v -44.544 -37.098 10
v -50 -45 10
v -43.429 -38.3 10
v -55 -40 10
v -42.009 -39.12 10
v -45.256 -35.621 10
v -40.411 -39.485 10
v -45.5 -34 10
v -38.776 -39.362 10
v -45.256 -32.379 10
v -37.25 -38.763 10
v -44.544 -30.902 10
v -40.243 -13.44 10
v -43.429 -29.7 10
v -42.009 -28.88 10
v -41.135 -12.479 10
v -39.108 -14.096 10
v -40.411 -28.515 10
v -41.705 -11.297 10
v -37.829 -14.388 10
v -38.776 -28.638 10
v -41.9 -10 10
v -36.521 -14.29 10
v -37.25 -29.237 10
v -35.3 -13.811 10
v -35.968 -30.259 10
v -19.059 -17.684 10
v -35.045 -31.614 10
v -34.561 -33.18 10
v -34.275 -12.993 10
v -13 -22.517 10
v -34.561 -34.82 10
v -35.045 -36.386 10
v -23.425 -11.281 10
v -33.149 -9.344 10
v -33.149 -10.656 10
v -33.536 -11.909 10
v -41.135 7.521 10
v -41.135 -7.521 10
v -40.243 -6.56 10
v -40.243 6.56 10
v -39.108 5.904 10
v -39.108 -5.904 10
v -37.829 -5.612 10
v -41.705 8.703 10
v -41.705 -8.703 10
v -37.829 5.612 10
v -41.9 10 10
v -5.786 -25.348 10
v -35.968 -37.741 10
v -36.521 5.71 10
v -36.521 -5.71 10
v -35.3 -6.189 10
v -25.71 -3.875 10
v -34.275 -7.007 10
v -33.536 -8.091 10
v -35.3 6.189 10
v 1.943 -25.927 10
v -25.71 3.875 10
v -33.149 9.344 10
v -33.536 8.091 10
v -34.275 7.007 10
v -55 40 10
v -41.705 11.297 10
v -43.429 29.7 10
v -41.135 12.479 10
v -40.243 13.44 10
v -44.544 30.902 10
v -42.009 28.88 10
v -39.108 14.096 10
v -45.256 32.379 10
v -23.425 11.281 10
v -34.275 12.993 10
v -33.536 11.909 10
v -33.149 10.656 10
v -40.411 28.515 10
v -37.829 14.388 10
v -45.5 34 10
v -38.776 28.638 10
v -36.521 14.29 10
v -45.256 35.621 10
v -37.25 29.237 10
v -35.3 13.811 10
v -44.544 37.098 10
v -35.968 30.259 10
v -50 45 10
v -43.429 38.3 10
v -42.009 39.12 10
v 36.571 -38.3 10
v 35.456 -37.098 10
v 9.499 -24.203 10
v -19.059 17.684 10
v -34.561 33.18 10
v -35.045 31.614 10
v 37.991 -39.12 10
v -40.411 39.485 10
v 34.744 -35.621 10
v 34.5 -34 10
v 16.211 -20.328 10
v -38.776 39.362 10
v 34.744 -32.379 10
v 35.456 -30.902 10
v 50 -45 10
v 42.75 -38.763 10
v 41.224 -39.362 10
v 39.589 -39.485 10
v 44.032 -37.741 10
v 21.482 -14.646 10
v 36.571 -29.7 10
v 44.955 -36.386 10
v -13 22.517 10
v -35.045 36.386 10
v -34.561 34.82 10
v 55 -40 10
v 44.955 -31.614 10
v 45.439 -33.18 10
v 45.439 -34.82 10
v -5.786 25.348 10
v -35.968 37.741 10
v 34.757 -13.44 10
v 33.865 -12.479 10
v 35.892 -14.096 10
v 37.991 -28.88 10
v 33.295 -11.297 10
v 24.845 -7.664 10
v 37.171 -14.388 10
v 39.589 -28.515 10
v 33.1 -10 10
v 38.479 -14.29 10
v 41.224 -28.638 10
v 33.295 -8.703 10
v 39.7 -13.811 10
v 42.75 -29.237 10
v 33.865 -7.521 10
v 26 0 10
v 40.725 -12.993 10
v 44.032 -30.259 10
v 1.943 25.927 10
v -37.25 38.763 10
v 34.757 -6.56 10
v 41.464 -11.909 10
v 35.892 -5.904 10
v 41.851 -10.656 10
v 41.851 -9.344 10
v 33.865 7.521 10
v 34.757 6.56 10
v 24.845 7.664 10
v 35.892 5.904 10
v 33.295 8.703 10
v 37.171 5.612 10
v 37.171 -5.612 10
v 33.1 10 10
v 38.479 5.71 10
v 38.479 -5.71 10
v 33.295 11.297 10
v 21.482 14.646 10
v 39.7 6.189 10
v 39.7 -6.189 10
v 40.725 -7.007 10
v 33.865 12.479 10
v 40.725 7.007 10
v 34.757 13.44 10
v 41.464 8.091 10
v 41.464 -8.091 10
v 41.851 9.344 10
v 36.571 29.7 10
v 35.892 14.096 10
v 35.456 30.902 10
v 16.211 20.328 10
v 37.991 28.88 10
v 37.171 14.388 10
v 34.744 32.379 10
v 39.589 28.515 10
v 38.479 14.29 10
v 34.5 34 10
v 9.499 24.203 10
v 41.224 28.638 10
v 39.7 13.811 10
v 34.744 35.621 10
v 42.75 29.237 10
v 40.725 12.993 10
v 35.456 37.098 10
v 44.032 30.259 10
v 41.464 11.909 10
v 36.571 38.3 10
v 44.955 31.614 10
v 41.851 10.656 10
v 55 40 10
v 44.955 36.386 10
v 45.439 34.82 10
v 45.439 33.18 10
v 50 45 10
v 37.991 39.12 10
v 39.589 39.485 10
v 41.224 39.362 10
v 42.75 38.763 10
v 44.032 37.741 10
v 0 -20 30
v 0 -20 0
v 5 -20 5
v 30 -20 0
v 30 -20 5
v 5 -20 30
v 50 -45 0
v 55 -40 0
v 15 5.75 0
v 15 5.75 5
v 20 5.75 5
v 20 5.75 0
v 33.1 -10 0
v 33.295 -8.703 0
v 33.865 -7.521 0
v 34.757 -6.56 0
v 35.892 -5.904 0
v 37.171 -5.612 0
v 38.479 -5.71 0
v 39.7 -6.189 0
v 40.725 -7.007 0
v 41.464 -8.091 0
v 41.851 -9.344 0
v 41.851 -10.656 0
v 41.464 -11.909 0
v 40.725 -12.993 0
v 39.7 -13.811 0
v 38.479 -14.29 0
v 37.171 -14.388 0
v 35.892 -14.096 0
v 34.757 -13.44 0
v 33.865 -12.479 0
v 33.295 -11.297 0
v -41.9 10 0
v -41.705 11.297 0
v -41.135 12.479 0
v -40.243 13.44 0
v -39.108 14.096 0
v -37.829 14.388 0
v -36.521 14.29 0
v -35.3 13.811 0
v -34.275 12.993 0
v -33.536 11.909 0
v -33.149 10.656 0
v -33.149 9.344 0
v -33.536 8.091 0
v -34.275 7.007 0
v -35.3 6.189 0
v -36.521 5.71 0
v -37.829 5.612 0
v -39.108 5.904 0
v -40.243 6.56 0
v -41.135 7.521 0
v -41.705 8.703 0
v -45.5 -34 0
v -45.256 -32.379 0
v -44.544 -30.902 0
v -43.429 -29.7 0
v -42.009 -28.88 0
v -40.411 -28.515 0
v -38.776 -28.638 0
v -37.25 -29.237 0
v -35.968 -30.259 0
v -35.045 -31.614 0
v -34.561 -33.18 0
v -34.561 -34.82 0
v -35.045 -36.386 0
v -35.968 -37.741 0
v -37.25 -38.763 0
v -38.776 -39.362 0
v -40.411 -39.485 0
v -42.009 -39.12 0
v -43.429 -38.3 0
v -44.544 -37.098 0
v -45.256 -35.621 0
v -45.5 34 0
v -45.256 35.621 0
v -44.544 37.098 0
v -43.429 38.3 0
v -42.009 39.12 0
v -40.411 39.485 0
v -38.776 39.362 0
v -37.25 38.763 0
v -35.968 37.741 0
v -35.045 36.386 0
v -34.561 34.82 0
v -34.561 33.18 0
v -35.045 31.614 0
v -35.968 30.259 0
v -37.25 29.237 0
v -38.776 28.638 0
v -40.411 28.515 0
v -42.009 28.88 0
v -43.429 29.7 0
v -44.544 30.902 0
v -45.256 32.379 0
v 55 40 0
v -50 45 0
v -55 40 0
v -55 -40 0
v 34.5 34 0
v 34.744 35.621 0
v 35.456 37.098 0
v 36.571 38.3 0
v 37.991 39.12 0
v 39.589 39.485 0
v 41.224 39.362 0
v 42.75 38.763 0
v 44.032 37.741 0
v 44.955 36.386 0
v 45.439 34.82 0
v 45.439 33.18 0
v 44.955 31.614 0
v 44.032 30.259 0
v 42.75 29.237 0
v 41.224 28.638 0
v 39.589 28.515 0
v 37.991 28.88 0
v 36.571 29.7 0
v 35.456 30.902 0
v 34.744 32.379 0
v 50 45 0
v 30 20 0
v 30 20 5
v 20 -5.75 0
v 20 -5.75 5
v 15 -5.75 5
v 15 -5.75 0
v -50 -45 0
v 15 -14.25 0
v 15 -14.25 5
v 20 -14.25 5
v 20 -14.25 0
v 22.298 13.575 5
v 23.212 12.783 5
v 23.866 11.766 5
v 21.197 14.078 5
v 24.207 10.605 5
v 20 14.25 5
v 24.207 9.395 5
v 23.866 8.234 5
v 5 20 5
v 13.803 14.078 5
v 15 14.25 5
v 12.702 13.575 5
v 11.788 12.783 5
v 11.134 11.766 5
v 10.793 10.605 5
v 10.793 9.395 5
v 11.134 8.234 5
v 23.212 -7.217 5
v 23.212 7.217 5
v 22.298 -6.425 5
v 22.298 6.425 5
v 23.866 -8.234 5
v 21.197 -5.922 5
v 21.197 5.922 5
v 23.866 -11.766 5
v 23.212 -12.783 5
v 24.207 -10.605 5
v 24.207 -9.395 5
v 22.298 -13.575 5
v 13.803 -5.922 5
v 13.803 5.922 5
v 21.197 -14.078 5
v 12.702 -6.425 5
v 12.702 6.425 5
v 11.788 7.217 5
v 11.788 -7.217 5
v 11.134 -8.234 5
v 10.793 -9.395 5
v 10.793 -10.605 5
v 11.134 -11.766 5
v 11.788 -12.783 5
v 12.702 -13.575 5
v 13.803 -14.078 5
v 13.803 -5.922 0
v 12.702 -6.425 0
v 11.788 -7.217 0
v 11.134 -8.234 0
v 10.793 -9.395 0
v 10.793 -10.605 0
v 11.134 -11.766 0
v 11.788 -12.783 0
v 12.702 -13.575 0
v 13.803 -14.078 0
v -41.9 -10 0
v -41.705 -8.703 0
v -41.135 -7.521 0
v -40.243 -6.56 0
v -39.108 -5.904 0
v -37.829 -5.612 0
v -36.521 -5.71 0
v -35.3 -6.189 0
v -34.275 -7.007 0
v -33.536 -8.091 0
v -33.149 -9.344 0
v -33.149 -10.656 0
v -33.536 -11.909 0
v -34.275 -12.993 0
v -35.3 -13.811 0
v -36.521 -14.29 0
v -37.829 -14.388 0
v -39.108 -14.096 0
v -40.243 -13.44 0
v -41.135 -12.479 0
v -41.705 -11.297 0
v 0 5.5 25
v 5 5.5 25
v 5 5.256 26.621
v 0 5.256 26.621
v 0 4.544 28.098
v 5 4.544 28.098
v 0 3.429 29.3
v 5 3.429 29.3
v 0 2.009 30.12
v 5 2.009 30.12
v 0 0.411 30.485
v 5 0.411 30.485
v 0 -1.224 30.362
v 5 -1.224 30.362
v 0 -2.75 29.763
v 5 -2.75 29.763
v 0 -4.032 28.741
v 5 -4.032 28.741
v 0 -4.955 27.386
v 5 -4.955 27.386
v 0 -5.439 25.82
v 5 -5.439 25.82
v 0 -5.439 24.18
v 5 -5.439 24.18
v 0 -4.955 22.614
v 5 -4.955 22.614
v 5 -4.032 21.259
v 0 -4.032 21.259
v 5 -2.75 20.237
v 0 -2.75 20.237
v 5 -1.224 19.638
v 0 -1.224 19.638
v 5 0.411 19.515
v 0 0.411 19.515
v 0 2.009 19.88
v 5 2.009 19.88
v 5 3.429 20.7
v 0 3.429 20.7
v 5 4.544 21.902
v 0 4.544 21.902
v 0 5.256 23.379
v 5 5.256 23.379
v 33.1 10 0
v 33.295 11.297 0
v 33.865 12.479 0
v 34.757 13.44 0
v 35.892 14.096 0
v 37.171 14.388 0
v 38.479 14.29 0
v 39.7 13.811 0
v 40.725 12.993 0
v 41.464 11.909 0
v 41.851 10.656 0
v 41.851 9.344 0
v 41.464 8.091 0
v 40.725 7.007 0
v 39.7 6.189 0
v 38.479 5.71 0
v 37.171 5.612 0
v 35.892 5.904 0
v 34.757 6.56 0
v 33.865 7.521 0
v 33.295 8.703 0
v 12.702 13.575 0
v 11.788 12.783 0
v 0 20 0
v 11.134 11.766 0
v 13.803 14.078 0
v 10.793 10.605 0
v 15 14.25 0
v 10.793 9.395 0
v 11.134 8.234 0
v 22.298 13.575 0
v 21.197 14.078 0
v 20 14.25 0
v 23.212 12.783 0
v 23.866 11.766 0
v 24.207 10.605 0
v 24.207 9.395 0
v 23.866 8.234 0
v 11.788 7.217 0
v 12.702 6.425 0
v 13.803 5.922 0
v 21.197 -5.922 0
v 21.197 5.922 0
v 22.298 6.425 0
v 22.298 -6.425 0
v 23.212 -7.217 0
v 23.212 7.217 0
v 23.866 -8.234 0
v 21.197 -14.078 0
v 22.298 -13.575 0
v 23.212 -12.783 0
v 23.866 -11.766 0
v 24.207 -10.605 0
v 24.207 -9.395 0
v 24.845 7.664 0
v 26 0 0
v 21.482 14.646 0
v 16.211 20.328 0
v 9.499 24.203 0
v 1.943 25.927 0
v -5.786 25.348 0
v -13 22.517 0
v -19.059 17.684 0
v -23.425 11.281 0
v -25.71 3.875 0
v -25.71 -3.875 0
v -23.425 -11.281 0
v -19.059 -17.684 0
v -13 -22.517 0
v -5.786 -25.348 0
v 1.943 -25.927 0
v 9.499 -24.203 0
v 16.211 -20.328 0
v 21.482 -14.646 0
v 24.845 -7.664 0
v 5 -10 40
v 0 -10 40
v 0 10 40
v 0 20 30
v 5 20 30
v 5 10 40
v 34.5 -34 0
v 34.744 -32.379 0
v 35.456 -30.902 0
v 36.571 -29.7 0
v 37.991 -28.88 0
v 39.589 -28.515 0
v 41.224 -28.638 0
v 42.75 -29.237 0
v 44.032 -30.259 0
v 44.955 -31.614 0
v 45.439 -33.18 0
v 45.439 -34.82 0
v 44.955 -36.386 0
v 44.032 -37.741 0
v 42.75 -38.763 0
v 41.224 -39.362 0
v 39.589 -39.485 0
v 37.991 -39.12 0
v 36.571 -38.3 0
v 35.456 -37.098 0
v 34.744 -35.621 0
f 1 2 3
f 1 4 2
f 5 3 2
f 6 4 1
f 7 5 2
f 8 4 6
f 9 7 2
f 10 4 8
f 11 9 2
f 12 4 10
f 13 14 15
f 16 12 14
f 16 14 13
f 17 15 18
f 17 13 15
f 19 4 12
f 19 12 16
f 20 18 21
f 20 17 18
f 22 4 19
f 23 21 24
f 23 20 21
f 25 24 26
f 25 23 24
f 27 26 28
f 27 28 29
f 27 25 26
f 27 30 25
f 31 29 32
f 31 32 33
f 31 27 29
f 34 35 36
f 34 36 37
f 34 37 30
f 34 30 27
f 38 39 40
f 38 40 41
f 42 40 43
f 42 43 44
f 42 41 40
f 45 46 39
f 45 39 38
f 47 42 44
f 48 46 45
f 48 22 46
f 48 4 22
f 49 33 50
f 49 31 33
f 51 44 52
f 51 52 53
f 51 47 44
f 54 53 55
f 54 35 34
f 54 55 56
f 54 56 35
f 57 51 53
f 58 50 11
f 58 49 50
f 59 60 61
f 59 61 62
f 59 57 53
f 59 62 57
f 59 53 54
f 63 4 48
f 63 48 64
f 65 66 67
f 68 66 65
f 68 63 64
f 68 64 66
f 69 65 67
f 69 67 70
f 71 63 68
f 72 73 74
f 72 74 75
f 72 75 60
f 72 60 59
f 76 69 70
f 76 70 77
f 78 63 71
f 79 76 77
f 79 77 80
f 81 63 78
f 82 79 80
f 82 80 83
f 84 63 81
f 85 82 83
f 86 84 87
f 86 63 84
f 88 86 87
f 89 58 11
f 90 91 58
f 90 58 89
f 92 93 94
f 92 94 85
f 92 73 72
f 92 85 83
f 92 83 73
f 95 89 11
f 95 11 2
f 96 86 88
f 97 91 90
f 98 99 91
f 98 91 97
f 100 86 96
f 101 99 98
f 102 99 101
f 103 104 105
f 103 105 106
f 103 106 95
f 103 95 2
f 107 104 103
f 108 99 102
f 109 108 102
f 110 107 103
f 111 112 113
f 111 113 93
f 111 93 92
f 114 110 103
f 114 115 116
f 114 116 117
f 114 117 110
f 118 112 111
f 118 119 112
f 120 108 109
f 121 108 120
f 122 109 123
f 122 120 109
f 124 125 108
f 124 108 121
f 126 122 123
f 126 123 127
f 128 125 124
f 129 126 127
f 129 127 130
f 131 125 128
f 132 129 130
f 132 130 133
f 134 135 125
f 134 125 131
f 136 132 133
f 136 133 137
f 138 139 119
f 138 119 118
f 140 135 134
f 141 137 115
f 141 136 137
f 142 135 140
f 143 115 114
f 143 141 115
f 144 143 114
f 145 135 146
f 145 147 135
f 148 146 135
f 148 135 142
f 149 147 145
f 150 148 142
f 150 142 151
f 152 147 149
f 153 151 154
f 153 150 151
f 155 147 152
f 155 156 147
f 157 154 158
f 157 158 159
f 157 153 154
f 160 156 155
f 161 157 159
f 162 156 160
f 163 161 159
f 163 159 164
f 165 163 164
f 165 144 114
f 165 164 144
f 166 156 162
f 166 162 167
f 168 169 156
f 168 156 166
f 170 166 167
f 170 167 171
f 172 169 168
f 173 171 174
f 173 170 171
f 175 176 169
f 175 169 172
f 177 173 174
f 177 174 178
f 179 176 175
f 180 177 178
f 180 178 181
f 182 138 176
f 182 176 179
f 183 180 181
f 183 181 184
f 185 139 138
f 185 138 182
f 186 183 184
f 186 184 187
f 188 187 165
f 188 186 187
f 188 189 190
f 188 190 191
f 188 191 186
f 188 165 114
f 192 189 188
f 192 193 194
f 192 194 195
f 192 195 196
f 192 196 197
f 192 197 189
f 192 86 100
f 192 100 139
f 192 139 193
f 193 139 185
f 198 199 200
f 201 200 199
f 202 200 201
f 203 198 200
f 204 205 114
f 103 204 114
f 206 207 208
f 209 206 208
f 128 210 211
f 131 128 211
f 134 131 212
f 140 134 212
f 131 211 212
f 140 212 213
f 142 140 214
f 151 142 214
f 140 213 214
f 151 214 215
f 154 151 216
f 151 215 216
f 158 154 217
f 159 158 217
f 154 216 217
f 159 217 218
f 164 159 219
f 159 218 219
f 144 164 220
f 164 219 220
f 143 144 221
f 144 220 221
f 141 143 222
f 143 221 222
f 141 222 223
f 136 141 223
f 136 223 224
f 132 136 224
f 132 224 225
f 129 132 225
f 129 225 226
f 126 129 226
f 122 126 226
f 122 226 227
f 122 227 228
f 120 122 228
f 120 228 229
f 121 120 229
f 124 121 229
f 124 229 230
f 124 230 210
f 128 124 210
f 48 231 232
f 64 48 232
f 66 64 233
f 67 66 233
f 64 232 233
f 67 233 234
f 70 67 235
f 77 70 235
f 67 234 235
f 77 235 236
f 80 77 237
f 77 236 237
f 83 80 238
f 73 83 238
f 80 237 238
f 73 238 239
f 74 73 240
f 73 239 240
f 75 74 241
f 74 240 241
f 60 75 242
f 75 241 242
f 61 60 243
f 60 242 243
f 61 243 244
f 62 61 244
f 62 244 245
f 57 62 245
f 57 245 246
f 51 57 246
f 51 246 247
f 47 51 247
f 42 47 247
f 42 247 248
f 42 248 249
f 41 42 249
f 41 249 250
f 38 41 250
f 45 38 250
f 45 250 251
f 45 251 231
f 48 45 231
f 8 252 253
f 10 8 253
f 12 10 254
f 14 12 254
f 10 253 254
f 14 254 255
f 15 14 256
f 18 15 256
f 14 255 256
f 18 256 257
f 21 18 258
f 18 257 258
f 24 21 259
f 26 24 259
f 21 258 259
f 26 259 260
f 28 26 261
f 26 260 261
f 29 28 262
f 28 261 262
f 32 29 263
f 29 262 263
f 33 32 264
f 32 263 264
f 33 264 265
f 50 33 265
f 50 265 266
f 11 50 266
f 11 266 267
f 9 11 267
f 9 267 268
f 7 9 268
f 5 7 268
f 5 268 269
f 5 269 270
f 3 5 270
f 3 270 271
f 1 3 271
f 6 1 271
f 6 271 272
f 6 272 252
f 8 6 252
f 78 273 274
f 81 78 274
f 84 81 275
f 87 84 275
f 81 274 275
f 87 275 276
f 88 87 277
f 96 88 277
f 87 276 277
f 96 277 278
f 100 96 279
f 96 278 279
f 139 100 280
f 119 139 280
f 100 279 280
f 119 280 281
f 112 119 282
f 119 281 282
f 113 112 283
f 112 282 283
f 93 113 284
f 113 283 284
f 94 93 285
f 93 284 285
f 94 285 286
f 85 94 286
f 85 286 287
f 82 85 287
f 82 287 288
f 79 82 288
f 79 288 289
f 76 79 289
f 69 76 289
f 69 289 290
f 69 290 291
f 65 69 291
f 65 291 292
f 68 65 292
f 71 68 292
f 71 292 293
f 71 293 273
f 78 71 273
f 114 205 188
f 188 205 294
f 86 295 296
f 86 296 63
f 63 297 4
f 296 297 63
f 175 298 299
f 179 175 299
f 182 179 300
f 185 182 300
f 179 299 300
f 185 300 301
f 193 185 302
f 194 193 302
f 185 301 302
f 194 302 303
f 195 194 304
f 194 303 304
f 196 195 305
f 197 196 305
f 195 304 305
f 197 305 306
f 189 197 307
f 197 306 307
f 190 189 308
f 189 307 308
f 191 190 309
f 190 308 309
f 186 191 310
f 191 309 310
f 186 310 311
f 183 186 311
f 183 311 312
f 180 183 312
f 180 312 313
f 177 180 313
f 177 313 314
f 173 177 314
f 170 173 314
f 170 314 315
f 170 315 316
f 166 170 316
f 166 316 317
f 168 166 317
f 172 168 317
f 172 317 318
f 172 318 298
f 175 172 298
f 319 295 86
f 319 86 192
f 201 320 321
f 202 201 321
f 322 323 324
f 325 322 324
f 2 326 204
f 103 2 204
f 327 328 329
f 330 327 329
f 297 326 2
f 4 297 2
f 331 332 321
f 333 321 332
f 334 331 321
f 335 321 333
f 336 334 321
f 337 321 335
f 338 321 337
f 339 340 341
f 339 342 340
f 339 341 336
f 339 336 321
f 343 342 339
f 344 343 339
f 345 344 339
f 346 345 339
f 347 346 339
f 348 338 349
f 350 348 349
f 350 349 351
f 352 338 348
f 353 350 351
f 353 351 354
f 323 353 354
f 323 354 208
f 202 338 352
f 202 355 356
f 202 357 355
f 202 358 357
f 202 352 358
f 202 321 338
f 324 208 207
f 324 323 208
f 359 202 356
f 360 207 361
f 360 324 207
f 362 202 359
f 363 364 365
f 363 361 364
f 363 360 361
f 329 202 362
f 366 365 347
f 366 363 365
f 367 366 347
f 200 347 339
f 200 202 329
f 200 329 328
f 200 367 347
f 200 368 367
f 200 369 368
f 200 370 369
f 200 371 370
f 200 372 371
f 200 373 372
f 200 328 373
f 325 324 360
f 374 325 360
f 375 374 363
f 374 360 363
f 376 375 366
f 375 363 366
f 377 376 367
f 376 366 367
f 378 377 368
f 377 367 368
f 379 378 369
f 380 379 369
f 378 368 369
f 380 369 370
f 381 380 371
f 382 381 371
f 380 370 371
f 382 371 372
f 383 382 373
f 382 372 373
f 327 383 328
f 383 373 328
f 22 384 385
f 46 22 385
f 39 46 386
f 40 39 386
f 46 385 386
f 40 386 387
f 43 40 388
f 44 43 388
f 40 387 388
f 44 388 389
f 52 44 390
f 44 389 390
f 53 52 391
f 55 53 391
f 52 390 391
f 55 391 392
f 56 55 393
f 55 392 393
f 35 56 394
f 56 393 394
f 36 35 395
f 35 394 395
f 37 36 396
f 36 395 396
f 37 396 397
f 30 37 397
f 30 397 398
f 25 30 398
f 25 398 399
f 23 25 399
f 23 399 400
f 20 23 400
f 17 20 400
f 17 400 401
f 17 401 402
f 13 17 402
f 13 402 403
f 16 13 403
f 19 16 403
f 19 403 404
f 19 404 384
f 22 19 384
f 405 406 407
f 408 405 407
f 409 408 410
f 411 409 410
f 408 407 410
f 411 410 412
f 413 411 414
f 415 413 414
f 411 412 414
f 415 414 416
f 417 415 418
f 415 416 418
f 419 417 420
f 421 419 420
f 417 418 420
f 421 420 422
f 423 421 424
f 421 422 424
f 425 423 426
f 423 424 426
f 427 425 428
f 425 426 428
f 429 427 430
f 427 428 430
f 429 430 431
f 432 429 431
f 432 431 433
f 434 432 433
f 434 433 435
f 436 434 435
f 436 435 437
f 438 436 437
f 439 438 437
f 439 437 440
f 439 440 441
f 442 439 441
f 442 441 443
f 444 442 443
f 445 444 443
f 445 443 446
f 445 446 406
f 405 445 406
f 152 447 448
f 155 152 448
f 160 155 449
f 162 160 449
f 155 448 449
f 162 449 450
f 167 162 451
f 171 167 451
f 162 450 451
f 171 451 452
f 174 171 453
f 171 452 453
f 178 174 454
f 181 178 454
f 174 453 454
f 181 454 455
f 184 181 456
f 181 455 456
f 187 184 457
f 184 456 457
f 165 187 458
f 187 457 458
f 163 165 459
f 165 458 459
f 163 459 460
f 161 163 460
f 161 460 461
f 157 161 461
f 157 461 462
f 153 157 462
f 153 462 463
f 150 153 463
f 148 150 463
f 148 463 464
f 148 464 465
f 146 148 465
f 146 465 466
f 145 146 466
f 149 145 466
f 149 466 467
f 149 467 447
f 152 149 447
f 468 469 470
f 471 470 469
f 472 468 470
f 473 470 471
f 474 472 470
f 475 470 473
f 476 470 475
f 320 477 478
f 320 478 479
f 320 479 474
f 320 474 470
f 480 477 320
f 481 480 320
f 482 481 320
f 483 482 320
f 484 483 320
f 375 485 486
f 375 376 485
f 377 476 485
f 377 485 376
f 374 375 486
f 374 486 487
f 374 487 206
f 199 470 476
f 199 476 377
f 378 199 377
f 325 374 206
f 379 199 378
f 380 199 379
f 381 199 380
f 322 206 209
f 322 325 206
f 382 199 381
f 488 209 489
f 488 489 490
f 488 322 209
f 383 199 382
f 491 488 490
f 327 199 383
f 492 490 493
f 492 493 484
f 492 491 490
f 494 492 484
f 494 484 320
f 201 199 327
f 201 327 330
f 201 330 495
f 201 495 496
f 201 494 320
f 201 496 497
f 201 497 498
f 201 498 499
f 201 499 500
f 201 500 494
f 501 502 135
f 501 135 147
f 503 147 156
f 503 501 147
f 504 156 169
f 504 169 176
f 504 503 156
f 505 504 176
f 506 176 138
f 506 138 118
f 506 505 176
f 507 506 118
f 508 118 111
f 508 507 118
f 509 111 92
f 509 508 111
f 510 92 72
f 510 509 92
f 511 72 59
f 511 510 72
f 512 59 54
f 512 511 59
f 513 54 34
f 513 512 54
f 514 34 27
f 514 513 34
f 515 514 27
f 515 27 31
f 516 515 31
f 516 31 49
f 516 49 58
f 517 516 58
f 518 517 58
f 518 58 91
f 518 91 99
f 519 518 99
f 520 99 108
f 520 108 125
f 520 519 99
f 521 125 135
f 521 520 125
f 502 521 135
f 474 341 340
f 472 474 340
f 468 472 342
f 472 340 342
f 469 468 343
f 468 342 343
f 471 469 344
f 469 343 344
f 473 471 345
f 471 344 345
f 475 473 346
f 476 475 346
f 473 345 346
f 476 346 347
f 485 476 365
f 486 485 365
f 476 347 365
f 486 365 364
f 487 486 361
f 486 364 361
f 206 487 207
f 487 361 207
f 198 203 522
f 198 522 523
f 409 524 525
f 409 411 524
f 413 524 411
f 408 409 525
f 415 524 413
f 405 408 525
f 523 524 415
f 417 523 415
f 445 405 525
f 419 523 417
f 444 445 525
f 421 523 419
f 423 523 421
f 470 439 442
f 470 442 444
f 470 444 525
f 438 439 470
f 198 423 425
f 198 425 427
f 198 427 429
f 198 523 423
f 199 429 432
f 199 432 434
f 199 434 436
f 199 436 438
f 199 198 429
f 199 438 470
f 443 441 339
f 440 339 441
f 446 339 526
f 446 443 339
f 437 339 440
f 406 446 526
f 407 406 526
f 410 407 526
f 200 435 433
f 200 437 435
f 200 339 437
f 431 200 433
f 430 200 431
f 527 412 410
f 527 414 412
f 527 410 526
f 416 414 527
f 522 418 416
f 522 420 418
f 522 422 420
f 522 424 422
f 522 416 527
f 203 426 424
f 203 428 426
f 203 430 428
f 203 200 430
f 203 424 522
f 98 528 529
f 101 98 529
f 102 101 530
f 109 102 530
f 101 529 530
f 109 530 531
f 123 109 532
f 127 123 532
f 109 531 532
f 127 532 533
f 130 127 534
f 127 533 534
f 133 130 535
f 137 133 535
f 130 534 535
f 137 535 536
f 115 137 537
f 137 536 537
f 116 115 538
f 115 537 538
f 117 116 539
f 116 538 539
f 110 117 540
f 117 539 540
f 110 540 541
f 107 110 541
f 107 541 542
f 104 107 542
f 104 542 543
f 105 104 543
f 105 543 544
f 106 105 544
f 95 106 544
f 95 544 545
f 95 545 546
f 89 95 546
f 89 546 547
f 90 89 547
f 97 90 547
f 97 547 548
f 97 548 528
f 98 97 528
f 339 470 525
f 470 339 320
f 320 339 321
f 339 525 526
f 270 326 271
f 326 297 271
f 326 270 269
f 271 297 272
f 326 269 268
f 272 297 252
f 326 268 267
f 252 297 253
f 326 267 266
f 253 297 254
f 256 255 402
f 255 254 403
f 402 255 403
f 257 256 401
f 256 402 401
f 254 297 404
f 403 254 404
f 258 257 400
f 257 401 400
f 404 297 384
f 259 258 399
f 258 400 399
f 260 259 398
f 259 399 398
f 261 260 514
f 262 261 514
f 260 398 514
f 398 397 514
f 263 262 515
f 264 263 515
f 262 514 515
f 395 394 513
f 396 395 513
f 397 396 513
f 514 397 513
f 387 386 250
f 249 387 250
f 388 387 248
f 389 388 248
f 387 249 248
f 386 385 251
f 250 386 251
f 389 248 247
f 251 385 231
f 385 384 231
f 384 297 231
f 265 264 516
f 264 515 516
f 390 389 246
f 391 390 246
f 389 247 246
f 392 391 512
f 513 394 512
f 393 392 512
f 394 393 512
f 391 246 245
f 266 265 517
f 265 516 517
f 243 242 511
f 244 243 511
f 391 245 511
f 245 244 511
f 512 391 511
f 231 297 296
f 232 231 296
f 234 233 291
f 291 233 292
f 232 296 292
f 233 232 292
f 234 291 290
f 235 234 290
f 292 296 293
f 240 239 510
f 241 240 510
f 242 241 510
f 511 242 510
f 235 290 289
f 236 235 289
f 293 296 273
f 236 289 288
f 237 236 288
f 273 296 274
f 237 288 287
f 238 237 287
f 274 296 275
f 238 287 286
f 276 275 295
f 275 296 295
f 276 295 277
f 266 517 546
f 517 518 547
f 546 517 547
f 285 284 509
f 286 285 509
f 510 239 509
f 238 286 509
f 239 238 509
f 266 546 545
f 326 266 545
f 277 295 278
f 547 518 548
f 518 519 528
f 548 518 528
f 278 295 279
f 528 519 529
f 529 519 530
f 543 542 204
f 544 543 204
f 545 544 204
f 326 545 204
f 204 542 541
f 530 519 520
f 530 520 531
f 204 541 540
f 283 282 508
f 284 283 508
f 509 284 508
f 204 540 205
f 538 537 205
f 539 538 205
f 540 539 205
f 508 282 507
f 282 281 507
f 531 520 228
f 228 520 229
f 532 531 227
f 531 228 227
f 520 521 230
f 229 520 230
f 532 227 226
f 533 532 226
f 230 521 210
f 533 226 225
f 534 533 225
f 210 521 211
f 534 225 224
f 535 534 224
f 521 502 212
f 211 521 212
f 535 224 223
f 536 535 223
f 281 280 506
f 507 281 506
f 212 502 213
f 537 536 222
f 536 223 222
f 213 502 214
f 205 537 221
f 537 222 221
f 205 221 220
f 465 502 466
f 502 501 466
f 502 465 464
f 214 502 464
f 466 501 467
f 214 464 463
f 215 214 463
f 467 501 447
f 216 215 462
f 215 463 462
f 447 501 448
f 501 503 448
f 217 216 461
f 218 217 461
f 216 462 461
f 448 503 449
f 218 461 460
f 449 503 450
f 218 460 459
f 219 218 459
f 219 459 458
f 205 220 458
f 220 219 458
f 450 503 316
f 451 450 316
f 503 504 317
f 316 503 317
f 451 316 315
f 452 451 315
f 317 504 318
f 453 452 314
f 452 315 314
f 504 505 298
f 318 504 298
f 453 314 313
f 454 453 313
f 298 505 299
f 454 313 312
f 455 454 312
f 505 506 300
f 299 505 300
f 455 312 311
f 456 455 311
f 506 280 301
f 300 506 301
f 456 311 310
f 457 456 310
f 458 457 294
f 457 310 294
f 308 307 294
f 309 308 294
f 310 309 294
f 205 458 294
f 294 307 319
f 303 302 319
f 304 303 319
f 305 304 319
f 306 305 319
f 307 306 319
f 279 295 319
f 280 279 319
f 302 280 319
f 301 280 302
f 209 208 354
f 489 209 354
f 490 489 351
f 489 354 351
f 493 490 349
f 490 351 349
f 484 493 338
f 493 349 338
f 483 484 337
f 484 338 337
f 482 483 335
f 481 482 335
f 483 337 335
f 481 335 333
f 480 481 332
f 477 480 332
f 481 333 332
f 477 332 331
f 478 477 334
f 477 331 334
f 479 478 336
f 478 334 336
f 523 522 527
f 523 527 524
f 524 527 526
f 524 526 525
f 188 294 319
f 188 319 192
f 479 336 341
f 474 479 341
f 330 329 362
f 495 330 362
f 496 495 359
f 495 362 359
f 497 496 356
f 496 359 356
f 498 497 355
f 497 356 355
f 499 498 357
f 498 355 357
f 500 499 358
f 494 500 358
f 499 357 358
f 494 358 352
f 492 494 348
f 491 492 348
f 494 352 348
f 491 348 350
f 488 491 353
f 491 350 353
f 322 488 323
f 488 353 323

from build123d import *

# Parameters (mm, degrees)
F0_W      = 110
F0_H      = 90
F0_R      = 26
F1_DEPTH  = 10
F3_D      = 11
F5_DEPTH  = 20
F7_D      = 11
F8_SIZE   = 10
F10_DEPTH = 25
F12_D     = 8.8
F13_SIZE  = 5


with BuildPart() as f1:
    # F0 (on Top) → F1 (new body)
    with BuildSketch(Plane.XY):
        Rectangle(F0_W, F0_H)
        Circle(F0_R, mode=Mode.SUBTRACT)
    extrude(amount=F1_DEPTH)

    # F3 (through all)
    with Locations(Plane.XY.offset(10)):
        with Locations((-40, 34), (-40, -34), (40, -34), (40, 34)):
            Hole(F3_D / 2)

    # F12 (through all)
    with Locations(Plane.XY.offset(10)):
        with Locations((-37.5, 10), (-37.5, -10), (37.5, -10), (37.5, 10)):
            Hole(F12_D / 2)

    # F13
    f13_edges = [f1.edges().sort_by_distance(p)[0] for p in [
        (-55, 45, 5),
        (55, 45, 5),
        (55, -45, 5),
        (-55, -45, 5),
    ]]
    chamfer(f13_edges, length=F13_SIZE)


with BuildPart() as f5:
    # F4 (on Front) → F5 (new body, symmetric)
    with BuildSketch(Plane.XZ):
        Polygon((0, 40), (0, 0), (30, 0), (30, 5), (5, 5), (5, 40), align=None)
    extrude(amount=F5_DEPTH, both=True)

    # F7 (through all)
    with Locations(Plane(origin=(0, 0, 0), x_dir=(0, -1, 0), z_dir=(-1, 0, 0))):
        with Locations((0, 25)):
            Hole(F7_D / 2)

    # F8
    f8_edges = [f5.edges().sort_by_distance(p)[0] for p in [
        (2.5, -20, 40),
        (2.5, 20, 40),
    ]]
    chamfer(f8_edges, length=F8_SIZE)

    # F9 (on face) → F10 (cut)
    with BuildSketch(Plane.XY.offset(5)):
        with BuildLine():
            Line((15, 5.75), (20, 5.75))
            ThreePointArc((20, 5.75), (24.25, 10), (20, 14.25))
            Line((20, 14.25), (15, 14.25))
            ThreePointArc((15, 14.25), (10.75, 10), (15, 5.75))
        make_face()
        with BuildLine():
            Line((20, -5.75), (15, -5.75))
            ThreePointArc((15, -5.75), (10.75, -10), (15, -14.25))
            Line((15, -14.25), (20, -14.25))
            ThreePointArc((20, -14.25), (24.25, -10), (20, -5.75))
        make_face()
    extrude(amount=-F10_DEPTH, mode=Mode.SUBTRACT)


solid = Compound([f1.part, f5.part])
